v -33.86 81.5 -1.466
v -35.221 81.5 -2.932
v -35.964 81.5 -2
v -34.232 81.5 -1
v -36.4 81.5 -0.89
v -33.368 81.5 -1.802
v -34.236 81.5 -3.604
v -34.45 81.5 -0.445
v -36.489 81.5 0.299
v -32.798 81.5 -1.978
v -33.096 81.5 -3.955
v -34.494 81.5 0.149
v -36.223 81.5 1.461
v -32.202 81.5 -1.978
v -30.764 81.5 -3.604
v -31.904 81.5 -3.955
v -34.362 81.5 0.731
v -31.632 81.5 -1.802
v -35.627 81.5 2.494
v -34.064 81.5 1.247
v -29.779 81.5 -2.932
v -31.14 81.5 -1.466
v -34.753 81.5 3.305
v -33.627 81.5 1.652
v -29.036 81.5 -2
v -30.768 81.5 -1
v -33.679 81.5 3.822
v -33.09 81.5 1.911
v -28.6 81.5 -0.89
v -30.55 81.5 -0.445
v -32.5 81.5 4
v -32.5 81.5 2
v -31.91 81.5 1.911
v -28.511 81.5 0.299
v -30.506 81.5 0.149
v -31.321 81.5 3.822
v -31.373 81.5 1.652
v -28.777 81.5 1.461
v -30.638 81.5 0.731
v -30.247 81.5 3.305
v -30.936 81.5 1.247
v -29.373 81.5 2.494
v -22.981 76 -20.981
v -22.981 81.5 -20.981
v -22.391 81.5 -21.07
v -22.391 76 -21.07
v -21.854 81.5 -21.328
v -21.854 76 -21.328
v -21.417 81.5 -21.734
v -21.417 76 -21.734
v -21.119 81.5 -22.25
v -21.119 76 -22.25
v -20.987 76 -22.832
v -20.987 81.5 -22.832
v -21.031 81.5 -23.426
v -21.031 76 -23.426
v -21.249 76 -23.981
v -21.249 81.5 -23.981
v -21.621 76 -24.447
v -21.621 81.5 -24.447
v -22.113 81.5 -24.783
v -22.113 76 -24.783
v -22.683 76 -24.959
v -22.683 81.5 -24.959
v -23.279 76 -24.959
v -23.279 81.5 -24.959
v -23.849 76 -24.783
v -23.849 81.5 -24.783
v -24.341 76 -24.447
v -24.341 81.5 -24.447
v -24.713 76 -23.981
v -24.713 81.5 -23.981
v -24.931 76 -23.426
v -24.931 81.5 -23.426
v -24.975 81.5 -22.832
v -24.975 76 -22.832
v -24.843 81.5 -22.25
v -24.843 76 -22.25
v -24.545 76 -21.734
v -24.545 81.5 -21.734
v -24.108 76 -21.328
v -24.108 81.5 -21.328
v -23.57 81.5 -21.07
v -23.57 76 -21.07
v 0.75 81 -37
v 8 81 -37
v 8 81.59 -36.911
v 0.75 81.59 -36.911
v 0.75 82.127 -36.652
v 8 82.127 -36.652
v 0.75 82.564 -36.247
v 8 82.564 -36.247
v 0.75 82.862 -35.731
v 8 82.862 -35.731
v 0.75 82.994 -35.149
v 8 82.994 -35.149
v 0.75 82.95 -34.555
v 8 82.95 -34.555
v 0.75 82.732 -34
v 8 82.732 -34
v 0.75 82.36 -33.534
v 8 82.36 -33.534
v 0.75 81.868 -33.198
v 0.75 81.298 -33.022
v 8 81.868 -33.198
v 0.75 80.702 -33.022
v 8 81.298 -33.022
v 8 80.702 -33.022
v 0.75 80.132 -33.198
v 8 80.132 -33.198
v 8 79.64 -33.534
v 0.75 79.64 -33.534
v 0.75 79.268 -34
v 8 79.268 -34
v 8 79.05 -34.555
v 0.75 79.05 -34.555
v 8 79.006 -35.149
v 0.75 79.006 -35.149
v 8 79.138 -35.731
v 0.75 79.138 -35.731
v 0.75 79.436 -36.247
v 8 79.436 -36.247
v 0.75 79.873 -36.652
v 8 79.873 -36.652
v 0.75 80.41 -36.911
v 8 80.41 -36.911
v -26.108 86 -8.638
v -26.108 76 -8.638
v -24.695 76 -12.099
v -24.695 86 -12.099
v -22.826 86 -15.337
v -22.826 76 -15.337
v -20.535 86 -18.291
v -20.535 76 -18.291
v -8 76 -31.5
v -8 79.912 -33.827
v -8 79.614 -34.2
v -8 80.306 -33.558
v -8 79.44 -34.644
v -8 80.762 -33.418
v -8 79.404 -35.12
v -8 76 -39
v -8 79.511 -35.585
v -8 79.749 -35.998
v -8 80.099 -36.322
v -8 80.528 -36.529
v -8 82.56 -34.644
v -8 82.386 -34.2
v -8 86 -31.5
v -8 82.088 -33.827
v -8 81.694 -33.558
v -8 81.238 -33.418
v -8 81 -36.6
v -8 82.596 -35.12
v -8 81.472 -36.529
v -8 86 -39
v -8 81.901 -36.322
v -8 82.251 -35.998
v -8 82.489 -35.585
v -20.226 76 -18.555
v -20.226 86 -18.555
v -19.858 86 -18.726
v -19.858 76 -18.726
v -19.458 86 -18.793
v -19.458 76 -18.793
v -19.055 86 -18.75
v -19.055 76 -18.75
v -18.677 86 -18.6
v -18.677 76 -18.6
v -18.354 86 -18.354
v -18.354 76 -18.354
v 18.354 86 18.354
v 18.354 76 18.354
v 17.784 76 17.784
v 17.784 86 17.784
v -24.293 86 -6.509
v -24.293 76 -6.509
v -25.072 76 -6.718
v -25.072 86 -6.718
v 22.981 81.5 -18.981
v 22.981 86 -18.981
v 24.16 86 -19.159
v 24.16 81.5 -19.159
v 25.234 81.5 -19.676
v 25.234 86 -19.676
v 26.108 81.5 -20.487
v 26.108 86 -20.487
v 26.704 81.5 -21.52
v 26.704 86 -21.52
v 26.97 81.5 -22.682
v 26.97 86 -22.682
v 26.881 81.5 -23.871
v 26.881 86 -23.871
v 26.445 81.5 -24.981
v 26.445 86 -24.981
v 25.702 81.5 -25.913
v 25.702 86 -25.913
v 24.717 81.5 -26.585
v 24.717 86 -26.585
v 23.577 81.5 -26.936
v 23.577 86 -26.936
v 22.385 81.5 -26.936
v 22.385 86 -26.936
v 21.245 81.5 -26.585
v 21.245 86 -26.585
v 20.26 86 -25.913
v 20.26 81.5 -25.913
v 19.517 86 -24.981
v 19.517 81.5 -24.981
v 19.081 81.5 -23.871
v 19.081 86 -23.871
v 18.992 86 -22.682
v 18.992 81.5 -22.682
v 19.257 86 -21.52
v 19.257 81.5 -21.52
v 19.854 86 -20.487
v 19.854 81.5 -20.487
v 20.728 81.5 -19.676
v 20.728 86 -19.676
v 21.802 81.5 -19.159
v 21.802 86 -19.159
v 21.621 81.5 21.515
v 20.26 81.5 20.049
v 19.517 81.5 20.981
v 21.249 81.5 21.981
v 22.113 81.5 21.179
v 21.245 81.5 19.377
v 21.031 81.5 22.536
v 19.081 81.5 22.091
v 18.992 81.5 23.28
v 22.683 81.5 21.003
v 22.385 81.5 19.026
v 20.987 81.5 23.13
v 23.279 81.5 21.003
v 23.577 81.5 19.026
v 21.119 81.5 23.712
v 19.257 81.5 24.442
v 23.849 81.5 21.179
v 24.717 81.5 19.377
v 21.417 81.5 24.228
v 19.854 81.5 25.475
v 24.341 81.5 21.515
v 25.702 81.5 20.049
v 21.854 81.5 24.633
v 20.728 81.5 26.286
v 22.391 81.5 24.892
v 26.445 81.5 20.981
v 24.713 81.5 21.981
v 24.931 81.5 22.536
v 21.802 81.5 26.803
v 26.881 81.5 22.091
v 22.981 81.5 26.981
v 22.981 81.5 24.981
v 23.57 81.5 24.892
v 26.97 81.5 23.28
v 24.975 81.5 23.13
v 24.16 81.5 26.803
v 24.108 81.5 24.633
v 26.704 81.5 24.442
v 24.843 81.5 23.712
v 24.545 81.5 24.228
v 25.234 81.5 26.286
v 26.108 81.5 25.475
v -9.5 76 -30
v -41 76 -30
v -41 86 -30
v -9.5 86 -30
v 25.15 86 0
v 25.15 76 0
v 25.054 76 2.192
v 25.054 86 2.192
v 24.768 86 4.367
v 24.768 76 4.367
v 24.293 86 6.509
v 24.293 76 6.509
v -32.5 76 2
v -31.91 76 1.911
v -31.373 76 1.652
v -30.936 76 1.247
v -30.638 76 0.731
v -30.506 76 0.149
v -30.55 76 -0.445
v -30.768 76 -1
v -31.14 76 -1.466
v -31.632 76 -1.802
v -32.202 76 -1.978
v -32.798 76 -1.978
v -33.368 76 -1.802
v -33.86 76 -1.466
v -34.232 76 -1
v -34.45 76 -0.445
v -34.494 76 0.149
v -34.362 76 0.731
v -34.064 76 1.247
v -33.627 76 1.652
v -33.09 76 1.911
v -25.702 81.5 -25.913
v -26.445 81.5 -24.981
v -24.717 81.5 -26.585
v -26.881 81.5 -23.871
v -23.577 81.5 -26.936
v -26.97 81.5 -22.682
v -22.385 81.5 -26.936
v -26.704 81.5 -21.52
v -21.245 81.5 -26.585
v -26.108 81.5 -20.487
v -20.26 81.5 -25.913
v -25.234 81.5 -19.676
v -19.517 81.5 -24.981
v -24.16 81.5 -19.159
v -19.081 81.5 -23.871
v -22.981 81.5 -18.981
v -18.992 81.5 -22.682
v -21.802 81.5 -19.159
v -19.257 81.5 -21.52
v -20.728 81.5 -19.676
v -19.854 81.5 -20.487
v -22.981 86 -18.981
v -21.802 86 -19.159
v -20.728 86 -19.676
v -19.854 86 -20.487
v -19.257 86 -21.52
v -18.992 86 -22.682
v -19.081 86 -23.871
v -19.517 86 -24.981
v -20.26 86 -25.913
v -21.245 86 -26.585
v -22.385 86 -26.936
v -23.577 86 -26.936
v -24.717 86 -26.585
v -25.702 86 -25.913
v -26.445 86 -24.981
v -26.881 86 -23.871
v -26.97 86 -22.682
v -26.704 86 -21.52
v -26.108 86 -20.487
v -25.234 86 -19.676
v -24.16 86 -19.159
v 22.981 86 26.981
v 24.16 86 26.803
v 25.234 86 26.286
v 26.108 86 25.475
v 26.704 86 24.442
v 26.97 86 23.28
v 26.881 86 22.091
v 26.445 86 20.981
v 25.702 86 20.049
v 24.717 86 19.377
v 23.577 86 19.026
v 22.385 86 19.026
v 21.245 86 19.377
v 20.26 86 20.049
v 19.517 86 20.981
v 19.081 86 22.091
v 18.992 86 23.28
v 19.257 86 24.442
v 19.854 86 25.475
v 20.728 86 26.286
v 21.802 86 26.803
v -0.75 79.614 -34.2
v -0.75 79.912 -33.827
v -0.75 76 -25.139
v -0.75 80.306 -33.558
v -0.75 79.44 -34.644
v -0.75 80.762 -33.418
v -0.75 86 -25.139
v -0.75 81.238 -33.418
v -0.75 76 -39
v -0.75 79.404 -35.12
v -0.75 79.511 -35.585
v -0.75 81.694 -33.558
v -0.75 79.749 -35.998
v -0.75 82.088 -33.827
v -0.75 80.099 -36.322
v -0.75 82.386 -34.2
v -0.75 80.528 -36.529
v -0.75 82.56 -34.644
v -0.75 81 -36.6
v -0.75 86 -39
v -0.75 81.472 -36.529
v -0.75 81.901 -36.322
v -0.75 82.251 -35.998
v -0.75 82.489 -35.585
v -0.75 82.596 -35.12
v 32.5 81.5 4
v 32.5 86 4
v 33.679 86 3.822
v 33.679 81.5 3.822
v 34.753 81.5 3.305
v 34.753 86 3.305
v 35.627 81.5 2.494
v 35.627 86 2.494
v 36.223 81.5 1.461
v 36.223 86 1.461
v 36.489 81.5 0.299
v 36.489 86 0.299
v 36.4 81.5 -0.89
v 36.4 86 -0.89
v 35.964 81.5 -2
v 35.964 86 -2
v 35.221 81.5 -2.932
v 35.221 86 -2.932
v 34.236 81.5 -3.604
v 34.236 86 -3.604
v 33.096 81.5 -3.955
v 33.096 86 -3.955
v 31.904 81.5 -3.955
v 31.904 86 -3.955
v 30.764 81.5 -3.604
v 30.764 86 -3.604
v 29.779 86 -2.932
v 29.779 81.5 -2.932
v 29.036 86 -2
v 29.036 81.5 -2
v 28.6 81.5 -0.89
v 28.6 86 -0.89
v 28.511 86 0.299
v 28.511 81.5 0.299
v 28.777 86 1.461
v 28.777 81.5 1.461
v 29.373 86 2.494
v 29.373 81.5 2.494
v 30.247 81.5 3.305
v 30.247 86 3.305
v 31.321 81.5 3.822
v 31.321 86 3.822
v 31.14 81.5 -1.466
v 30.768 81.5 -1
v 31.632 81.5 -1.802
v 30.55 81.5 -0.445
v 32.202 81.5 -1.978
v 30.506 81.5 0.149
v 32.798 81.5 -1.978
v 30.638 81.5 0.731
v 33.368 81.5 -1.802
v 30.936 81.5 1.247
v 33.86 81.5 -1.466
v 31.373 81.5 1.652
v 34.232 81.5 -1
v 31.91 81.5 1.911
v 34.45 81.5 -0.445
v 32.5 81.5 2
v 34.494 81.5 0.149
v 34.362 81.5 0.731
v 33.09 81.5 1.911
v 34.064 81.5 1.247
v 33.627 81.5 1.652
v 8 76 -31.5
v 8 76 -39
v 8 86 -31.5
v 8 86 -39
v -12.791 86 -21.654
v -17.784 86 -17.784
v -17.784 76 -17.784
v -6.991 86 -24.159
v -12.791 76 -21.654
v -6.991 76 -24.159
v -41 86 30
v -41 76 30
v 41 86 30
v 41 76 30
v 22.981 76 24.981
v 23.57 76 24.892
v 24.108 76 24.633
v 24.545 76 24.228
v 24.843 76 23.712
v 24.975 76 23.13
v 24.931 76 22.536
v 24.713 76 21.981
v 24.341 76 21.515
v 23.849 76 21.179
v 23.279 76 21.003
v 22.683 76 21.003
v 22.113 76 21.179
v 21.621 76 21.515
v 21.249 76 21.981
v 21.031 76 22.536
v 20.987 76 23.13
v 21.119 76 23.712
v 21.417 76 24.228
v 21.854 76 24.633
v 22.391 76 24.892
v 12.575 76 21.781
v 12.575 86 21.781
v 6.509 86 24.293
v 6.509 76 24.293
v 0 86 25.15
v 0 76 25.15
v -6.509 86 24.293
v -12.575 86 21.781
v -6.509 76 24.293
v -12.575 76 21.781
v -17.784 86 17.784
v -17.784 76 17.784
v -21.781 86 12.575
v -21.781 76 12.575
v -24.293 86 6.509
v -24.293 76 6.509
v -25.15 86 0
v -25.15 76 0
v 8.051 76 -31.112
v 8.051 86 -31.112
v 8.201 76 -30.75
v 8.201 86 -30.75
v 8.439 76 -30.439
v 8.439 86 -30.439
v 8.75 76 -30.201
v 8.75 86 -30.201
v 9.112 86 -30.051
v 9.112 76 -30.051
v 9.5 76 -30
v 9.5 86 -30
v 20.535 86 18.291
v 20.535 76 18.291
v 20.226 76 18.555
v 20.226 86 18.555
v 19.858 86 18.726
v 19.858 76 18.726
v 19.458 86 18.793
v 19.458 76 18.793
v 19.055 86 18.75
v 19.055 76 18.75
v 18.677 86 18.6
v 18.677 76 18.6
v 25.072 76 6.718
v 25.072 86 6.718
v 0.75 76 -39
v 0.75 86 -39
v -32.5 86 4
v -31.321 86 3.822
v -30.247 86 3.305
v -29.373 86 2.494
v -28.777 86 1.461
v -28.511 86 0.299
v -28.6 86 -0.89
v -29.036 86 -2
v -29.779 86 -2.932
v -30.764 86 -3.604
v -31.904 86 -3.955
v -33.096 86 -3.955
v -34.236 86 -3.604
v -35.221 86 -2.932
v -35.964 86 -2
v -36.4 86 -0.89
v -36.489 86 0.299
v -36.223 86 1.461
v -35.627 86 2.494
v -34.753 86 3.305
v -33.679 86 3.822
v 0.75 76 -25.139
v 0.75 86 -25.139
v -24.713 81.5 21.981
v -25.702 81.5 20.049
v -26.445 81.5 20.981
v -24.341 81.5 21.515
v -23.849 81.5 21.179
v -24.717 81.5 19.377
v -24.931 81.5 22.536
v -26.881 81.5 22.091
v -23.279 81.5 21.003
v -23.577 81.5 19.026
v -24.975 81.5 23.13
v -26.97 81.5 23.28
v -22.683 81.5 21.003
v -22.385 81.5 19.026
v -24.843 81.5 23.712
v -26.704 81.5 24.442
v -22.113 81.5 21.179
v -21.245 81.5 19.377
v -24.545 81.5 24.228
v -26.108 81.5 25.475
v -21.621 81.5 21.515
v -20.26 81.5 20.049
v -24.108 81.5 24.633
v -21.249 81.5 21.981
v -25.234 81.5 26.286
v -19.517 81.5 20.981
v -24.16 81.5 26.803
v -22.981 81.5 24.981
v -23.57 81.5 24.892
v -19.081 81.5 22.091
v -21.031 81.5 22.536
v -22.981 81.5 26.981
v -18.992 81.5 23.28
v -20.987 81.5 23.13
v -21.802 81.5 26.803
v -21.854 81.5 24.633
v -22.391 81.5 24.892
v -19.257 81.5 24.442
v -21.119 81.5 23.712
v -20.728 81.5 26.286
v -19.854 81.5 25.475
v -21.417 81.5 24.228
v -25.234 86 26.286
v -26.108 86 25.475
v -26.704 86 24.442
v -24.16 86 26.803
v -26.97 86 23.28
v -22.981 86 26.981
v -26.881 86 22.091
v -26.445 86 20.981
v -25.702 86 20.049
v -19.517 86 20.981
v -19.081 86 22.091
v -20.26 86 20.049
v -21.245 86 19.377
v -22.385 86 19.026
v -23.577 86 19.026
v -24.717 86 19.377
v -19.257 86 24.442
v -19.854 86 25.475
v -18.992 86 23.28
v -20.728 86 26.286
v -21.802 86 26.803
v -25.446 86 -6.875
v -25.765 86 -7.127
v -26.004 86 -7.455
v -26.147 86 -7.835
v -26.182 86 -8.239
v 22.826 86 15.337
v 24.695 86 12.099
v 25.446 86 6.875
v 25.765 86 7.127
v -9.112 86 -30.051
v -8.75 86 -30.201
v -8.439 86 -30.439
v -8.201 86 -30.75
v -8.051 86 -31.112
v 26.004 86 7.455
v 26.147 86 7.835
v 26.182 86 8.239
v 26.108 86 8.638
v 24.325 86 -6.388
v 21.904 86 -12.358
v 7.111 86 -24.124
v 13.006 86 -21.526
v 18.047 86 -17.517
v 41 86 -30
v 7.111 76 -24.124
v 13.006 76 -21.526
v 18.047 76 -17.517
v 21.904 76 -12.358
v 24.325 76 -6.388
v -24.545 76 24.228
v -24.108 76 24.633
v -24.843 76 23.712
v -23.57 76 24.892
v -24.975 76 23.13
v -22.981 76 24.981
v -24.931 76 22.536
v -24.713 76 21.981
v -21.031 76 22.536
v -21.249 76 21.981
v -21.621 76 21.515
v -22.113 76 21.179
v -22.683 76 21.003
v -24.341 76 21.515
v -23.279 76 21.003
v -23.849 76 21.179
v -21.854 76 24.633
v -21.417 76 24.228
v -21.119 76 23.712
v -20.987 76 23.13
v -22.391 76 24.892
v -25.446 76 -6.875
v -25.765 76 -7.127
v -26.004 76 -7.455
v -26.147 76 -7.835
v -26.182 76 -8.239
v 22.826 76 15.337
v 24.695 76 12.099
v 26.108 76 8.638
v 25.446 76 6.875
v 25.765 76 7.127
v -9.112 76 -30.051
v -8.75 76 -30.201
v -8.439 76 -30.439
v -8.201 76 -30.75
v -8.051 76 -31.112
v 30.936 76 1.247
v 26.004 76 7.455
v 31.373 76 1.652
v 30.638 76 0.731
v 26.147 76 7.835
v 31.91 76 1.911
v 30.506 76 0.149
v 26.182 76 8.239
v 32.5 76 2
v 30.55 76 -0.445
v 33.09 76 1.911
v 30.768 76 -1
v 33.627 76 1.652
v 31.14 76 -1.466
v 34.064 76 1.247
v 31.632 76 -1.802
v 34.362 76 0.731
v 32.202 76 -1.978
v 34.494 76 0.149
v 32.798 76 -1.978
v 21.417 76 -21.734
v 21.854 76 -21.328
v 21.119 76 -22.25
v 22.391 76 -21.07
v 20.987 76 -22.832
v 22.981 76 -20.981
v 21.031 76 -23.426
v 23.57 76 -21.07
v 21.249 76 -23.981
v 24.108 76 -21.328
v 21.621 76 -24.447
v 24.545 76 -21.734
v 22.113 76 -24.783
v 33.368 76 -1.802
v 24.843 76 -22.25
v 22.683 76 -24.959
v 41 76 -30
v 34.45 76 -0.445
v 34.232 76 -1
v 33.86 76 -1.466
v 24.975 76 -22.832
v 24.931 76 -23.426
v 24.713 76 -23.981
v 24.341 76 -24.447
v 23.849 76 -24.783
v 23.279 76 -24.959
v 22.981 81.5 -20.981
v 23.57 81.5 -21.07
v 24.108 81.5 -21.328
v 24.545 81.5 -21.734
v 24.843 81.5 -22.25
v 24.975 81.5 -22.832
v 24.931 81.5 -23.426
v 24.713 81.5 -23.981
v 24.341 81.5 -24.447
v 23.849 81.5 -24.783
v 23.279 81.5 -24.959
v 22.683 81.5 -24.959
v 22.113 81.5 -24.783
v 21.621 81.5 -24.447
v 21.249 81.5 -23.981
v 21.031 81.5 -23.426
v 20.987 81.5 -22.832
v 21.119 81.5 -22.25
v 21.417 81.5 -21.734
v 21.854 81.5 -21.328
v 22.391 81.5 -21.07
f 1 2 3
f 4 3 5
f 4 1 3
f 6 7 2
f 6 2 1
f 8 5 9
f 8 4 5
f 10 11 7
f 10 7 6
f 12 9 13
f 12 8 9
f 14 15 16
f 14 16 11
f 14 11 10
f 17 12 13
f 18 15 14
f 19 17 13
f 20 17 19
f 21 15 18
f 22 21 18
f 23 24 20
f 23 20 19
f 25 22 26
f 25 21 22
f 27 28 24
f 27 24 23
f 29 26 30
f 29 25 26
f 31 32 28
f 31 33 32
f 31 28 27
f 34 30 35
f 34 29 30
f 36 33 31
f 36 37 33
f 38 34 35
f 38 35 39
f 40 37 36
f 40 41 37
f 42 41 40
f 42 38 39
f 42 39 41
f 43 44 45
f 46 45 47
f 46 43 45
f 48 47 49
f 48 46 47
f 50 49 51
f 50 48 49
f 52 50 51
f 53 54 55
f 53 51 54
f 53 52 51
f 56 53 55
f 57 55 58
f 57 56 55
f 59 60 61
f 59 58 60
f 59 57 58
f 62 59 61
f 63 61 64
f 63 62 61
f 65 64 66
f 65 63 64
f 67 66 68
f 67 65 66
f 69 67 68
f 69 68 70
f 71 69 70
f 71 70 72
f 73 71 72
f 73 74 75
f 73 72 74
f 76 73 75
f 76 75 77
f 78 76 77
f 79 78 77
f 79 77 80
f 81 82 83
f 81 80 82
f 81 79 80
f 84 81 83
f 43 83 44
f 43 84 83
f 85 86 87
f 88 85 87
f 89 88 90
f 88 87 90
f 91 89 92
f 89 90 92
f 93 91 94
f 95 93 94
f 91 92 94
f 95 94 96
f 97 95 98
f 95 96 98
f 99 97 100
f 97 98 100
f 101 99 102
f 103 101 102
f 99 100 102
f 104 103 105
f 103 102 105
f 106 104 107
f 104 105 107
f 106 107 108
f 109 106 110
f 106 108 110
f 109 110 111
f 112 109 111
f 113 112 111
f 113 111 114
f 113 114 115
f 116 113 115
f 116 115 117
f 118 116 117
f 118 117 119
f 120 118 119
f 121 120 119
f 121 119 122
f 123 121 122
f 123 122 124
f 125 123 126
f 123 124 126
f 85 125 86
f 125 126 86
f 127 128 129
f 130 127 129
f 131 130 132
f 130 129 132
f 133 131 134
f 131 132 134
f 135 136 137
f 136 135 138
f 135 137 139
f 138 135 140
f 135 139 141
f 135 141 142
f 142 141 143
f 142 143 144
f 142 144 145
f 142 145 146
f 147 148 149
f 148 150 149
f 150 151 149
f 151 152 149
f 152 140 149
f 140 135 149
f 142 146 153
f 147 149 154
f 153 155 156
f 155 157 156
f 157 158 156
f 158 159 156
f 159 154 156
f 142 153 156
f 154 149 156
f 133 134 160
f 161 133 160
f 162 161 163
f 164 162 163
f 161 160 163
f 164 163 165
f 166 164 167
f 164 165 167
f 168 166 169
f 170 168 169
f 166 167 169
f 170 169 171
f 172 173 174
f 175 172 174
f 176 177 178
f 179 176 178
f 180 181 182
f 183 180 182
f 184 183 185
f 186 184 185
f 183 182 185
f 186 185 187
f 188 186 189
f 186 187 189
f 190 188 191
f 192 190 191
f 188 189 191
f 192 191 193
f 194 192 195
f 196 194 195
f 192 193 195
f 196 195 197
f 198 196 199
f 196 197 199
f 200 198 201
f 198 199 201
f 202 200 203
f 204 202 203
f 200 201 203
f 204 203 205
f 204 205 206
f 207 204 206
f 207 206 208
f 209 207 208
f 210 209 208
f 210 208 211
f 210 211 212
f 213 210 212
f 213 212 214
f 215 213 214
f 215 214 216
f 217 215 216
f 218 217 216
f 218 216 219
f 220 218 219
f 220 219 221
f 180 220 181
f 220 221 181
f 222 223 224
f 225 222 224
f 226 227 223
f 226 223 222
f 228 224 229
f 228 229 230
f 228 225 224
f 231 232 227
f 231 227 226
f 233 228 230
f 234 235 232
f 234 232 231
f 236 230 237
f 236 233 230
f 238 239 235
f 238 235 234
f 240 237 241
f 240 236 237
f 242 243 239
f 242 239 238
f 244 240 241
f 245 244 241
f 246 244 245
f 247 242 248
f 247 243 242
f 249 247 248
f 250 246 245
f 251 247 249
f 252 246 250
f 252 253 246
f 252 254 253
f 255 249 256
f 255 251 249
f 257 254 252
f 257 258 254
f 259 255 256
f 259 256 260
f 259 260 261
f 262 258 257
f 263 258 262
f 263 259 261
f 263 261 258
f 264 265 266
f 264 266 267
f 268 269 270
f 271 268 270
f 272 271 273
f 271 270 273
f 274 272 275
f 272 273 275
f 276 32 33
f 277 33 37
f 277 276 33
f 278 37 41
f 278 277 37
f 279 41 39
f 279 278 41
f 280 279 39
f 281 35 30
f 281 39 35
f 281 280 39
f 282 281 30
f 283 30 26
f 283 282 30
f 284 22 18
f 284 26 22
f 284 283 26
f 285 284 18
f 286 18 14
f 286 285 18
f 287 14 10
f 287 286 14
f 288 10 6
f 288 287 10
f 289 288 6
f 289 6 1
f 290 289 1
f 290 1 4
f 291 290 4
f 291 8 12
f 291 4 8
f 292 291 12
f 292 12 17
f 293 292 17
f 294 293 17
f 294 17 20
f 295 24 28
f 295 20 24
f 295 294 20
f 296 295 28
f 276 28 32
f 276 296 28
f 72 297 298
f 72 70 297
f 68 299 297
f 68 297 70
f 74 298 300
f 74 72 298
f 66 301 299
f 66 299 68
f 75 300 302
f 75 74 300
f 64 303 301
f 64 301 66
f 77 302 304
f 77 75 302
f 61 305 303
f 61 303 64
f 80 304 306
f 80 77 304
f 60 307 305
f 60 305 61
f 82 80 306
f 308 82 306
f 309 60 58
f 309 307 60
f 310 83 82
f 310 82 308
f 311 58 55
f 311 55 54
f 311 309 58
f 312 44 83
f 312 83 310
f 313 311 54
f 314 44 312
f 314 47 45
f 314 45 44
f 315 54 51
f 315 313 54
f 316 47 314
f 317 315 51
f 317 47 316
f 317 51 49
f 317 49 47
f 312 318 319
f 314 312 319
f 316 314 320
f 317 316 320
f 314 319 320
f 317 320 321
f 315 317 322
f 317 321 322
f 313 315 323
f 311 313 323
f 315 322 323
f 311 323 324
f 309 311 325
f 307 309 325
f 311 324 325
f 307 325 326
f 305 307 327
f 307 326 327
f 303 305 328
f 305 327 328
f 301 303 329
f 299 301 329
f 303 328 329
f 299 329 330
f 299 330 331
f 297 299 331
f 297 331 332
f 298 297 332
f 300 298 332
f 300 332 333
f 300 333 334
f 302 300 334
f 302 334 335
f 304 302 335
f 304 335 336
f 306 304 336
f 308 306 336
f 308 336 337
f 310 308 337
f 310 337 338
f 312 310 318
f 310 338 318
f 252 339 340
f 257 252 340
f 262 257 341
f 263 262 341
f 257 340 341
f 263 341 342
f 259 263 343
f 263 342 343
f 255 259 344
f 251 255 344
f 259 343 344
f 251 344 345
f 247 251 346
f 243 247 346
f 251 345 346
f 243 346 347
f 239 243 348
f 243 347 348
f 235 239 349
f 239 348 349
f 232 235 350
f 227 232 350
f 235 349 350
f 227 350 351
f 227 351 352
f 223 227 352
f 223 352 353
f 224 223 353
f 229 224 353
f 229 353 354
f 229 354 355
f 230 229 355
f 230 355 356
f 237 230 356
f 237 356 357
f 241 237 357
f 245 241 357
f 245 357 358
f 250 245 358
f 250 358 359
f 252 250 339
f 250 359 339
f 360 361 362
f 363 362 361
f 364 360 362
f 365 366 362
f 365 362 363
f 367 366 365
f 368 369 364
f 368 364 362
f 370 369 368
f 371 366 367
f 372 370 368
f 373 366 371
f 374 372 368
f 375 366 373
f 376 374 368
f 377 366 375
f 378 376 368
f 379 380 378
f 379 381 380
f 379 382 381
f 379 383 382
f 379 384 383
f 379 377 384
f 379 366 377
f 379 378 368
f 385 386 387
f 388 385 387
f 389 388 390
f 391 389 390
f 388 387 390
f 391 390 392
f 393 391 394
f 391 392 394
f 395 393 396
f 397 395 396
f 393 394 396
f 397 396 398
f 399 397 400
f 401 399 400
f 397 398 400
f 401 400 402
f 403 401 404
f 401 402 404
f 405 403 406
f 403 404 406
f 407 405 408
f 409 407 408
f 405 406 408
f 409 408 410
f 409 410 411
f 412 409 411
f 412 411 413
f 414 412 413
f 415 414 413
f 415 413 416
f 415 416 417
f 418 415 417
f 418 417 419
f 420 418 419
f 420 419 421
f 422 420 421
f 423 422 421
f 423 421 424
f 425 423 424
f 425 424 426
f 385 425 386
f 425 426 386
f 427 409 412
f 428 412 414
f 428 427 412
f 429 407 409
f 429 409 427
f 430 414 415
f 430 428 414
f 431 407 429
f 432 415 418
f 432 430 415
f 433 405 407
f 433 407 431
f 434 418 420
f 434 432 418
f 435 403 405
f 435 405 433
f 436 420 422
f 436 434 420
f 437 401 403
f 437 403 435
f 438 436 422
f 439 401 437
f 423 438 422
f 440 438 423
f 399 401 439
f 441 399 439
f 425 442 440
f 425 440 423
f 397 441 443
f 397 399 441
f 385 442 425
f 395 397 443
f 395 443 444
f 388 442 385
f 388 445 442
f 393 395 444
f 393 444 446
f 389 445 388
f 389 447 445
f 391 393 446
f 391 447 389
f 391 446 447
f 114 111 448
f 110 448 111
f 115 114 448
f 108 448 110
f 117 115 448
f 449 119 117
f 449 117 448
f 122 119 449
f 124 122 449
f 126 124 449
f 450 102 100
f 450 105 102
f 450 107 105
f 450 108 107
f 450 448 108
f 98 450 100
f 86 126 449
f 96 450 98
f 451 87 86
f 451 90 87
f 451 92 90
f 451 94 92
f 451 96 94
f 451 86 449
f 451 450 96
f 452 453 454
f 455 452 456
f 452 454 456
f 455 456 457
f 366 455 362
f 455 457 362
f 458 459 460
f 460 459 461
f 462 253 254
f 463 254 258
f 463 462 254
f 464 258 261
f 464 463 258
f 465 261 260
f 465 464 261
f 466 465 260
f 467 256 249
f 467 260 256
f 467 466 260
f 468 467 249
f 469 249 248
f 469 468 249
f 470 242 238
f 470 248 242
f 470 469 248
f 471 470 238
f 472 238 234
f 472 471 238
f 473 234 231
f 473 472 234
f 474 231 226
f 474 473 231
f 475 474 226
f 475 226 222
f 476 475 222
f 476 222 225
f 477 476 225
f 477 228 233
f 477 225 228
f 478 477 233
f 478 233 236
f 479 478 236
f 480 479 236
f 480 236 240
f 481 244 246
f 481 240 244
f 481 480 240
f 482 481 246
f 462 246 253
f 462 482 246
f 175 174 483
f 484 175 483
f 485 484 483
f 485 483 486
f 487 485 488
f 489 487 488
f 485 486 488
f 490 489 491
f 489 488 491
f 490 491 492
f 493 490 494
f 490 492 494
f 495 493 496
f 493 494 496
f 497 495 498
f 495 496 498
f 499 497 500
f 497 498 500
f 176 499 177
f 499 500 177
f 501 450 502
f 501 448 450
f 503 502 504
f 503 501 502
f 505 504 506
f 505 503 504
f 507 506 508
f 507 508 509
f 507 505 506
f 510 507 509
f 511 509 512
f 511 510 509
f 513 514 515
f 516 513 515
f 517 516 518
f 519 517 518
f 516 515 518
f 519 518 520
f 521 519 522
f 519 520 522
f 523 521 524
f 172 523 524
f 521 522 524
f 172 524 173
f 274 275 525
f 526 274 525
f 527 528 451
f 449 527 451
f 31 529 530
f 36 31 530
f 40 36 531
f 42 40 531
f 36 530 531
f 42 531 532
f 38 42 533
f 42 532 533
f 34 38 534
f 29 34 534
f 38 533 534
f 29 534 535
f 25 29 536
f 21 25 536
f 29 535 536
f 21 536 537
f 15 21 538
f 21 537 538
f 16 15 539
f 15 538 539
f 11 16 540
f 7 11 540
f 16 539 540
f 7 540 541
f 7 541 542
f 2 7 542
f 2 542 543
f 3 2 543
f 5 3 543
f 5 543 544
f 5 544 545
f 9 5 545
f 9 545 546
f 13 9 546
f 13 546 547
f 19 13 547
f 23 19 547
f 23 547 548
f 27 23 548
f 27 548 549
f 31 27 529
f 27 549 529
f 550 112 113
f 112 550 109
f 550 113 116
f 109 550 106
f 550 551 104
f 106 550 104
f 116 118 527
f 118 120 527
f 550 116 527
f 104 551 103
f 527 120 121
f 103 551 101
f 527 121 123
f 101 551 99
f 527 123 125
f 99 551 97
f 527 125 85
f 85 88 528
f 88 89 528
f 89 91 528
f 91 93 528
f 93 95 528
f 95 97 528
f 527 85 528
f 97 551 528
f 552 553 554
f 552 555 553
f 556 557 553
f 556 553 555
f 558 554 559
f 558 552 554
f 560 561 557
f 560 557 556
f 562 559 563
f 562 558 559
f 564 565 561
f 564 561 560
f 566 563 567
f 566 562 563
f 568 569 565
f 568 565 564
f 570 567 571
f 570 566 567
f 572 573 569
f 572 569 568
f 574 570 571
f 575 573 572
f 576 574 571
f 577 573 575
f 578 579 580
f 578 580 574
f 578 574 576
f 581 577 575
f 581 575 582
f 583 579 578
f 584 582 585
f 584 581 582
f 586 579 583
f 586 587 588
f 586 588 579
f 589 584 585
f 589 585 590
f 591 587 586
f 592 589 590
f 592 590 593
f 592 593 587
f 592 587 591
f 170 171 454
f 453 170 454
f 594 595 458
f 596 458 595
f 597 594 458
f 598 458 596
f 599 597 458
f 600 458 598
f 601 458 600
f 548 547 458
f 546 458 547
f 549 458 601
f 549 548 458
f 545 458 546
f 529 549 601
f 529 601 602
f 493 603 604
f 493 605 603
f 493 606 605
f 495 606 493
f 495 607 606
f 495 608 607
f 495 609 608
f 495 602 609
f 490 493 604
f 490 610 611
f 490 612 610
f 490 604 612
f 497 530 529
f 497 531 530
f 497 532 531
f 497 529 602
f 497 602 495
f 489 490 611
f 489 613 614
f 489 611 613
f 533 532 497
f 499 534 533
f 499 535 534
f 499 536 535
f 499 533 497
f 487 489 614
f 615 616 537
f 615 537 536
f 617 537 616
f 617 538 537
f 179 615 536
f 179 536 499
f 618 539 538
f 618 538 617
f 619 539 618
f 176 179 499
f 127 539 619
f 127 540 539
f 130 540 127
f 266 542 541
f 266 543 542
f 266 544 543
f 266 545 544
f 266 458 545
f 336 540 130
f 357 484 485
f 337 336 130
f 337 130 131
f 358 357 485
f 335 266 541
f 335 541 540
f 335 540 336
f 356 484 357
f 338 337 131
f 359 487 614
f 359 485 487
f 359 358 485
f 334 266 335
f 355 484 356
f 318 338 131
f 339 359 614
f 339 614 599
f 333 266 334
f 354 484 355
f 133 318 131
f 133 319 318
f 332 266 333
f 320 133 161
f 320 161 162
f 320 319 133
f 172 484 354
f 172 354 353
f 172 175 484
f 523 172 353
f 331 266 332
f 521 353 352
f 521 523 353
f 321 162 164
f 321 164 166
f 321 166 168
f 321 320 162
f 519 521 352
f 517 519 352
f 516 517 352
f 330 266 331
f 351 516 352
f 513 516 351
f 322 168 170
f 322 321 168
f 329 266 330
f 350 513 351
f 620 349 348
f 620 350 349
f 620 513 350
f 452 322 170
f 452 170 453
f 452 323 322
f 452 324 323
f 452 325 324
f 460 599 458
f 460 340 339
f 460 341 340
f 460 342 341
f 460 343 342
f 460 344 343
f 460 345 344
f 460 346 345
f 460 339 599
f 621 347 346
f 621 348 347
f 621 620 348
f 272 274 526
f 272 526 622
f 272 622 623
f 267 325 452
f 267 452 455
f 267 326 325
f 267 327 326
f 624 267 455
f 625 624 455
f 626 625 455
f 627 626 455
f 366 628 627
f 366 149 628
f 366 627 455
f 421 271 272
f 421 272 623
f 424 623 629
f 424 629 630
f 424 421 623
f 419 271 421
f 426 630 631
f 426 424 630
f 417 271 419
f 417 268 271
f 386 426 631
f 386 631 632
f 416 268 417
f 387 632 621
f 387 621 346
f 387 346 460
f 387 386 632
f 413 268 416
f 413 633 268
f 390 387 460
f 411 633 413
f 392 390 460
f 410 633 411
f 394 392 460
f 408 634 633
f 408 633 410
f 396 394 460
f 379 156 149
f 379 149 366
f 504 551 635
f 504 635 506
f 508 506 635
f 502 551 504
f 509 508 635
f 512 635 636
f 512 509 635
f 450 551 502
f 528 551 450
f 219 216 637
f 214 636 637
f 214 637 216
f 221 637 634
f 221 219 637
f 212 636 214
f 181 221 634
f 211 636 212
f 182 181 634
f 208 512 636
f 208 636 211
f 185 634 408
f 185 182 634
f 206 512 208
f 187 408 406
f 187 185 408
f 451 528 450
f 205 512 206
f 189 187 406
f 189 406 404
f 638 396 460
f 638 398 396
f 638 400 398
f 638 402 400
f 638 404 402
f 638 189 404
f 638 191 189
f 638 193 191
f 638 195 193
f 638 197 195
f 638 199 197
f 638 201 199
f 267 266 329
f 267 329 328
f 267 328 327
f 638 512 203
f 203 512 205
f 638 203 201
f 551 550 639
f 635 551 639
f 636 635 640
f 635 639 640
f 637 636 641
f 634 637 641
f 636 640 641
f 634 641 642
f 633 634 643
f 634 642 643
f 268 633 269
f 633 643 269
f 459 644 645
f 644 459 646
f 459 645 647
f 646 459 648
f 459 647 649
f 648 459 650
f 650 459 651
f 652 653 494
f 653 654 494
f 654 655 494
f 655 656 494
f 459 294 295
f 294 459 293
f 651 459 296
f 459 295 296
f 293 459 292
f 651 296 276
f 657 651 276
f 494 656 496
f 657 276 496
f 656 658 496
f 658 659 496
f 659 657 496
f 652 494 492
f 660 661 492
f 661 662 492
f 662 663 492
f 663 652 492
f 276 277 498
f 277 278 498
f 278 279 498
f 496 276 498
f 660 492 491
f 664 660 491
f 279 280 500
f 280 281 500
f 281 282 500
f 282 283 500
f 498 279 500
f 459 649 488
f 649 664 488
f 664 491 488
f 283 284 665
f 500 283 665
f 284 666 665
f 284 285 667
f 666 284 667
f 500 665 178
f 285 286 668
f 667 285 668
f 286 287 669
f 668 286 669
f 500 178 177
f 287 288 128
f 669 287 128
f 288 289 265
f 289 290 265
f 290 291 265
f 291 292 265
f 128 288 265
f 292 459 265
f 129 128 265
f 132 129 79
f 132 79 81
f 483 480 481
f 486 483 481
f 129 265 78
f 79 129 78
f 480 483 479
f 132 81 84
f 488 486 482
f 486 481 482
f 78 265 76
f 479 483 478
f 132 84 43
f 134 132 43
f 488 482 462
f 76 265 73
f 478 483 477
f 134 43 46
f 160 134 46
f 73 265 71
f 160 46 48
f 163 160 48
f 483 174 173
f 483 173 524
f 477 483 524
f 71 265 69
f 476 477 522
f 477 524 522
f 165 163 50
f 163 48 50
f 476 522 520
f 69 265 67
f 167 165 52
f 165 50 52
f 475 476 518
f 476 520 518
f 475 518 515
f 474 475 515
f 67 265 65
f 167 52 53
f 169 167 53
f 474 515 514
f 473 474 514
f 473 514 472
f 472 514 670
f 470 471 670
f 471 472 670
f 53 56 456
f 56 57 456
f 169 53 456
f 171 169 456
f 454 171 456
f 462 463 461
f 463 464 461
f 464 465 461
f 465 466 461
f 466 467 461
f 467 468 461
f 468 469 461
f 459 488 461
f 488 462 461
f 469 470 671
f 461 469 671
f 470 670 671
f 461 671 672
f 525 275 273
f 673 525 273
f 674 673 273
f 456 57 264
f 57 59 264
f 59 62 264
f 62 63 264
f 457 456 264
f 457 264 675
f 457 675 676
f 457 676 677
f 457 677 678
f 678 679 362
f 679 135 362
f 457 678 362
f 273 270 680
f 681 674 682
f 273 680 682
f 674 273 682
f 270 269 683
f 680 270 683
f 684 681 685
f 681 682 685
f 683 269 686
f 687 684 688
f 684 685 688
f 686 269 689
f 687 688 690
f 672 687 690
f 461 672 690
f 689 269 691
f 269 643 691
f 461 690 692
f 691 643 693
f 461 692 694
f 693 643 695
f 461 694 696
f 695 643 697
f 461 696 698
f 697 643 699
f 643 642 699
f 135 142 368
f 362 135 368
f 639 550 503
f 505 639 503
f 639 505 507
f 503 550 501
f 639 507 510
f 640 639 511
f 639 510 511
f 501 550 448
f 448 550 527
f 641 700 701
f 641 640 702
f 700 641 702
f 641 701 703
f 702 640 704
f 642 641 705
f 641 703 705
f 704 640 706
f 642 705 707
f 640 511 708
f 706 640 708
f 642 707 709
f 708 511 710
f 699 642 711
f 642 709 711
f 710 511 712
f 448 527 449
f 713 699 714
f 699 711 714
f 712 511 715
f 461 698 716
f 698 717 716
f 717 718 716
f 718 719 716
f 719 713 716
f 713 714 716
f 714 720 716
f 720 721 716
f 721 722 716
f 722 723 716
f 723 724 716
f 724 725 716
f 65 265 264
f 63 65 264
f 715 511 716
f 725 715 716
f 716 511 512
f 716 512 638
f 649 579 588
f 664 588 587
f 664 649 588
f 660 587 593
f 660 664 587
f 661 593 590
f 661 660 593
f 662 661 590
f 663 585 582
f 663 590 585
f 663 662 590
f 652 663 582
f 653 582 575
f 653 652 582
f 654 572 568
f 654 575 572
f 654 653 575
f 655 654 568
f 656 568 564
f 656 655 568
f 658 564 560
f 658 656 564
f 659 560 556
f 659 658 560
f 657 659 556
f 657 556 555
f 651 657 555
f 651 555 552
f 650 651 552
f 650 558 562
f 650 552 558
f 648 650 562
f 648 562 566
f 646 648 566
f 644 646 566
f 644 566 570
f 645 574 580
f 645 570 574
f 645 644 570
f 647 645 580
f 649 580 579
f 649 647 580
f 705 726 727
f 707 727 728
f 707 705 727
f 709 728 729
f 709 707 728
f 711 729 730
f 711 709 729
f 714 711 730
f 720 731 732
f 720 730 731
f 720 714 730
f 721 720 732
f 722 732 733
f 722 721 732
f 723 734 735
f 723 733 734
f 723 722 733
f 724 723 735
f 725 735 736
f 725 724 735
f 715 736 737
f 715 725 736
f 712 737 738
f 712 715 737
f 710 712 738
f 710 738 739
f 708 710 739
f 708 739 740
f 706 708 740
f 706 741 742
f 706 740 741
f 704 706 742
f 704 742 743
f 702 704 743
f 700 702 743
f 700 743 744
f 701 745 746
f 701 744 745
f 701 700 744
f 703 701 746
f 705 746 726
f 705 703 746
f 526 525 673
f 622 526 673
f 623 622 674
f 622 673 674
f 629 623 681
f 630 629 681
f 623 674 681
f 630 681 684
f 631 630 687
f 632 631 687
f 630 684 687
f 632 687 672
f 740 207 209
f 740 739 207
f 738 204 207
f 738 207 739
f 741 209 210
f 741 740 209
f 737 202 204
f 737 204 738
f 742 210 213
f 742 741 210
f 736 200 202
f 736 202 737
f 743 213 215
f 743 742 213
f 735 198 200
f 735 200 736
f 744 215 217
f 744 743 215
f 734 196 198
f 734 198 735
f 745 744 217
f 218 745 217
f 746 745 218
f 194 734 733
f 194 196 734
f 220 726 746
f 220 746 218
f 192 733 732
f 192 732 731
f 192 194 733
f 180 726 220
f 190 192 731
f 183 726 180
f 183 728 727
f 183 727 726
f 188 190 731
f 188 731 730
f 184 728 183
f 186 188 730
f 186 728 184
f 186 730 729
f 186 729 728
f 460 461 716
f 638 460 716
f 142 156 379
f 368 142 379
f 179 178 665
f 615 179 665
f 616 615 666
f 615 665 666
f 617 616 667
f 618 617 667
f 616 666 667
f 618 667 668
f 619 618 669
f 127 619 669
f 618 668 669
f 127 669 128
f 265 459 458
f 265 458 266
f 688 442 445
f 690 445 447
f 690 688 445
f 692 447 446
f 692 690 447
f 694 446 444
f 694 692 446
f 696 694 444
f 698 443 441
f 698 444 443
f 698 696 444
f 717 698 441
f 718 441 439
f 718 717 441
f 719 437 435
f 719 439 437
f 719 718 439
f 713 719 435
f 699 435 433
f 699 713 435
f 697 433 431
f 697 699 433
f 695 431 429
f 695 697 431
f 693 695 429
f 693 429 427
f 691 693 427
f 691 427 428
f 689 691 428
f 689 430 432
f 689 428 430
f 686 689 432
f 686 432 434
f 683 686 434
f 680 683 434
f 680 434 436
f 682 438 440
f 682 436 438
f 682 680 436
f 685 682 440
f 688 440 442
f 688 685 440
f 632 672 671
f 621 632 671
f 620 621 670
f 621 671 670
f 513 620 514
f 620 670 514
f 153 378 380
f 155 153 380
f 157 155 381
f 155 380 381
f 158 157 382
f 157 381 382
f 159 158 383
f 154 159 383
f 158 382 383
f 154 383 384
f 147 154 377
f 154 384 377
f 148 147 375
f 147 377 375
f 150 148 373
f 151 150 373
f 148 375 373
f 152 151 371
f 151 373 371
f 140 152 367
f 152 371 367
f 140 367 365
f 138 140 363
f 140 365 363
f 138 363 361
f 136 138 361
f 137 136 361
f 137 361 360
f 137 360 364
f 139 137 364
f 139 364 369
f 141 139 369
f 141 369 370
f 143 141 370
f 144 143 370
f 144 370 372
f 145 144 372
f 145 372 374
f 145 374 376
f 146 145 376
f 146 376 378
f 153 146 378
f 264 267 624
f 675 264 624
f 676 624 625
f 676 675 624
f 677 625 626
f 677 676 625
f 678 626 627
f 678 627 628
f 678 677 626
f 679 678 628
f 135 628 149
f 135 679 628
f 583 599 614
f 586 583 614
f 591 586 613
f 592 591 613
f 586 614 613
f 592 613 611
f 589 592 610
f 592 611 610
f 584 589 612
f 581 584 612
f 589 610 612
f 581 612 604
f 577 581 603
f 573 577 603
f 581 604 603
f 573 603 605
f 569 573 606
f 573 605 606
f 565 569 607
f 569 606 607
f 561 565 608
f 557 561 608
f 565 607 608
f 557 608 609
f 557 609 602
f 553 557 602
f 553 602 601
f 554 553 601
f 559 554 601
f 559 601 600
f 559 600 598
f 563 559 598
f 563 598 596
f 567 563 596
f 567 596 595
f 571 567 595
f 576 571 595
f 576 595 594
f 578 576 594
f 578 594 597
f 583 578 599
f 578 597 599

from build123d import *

# Parameters (mm, degrees)
SKETCH1_W           = 82
SKETCH1_H           = 60
SKETCH1_R           = 1.999999999
SKETCH1_R_2         = 2.000000001
SKETCH1_R_3         = 1.999999998
SKETCH1_R_4         = 2.000000002
BOSS_EXTRUDE1_DEPTH = 10
SKETCH2_W           = 16
SKETCH2_H           = 9
BOSS_EXTRUDE2_DEPTH = 10
SKETCH3_W           = 1.5
SKETCH3_H           = 14
CUT_EXTRUDE1_DEPTH  = 10
SKETCH4_R           = 2
CUT_EXTRUDE2_DEPTH  = 7.25
SKETCH5_R           = 1.6
CUT_EXTRUDE3_DEPTH  = 10
SKETCH7_R           = 4.000000002
SKETCH7_R_2         = 4.000000001
SKETCH7_R_3         = 4
SKETCH7_R_4         = 3.999999999
SKETCH7_R_5         = 3.999999998
CUT_EXTRUDE4_DEPTH  = 4.5
FILLET1_R           = 1.5


with BuildPart() as part:
    # Sketch1 → Boss-Extrude1 (new body)
    with BuildSketch(Plane(origin=(0, 76, 0), x_dir=(1, 0, 0), z_dir=(0, 1, 0))):
        Rectangle(SKETCH1_W, SKETCH1_H)
        with Locations(Location((-22.980970387, -22.98097039, 0), (0, 0, 270))):
            Circle(SKETCH1_R, mode=Mode.SUBTRACT)
        with Locations(Location((-32.5, -2e-09, 0), (0, 0, 270))):
            Circle(SKETCH1_R_2, mode=Mode.SUBTRACT)
        with Locations(Location((22.98097039, -22.980970387, 0), (0, 0, 270))):
            Circle(SKETCH1_R_3, mode=Mode.SUBTRACT)
        with BuildLine():
            ThreePointArc((-20.534900496, 18.291196287), (-19.458102274, 18.792869946), (-18.354154843, 18.354154843))
            Line((-18.354154843, 18.354154843), (-17.783735547, 17.783735547))
            ThreePointArc((-17.783735547, 17.783735547), (9.624488324, 23.235570243), (25.15, 0))
            ThreePointArc((25.15, 0), (24.934838264, -3.282733734), (24.293034531, -6.509298984))
            Line((24.293034531, -6.509298984), (25.072241781, -6.718086938))
            ThreePointArc((25.072241781, -6.718086938), (26.00415392, -7.454775906), (26.108090898, -8.638147351))
            ThreePointArc((26.108090898, -8.638147351), (23.815698604, -13.75), (20.534900496, -18.291196287))
            ThreePointArc((20.534900496, -18.291196287), (19.458102274, -18.792869946), (18.354154843, -18.354154843))
            Line((18.354154843, -18.354154843), (17.783735547, -17.783735547))
            ThreePointArc((17.783735547, -17.783735547), (-12.575, -21.780538905), (-24.293034531, 6.509298984))
            Line((-24.293034531, 6.509298984), (-25.072241781, 6.718086938))
            ThreePointArc((-25.072241781, 6.718086938), (-26.00415392, 7.454775906), (-26.108090898, 8.638147351))
            ThreePointArc((-26.108090898, 8.638147351), (-23.815698604, 13.75), (-20.534900496, 18.291196287))
        make_face(mode=Mode.SUBTRACT)
        with Locations(Location((-22.98097039, 22.980970387, 0), (0, 0, 270))):
            Circle(SKETCH1_R_4, mode=Mode.SUBTRACT)
        with Locations(Location((32.5, 2e-09, 0), (0, 0, 270))):
            Circle(SKETCH1_R, mode=Mode.SUBTRACT)
        with Locations(Location((22.980970387, 22.98097039, 0), (0, 0, 270))):
            Circle(SKETCH1_R_2, mode=Mode.SUBTRACT)
    extrude(amount=BOSS_EXTRUDE1_DEPTH)

    # Sketch2 → Boss-Extrude2 (add)
    with BuildSketch(Plane(origin=(0, 86, 0), x_dir=(1, 0, 0), z_dir=(0, 1, 0))):
        with Locations((0, 34.5)):
            Rectangle(SKETCH2_W, SKETCH2_H)
    extrude(amount=-BOSS_EXTRUDE2_DEPTH)

    # Sketch3 → Cut-Extrude1 (cut)
    with BuildSketch(Plane(origin=(0, 86, 0), x_dir=(1, 0, 0), z_dir=(0, 1, 0))):
        with Locations((0, 32)):
            Rectangle(SKETCH3_W, SKETCH3_H)
    extrude(amount=-CUT_EXTRUDE1_DEPTH, mode=Mode.SUBTRACT)

    # Sketch4 → Cut-Extrude2 (cut)
    with BuildSketch(Plane(origin=(8, 0, 0), x_dir=(0, 0, -1), z_dir=(1, 0, 0))):
        with Locations((35, 81)):
            Circle(SKETCH4_R)
    extrude(amount=-CUT_EXTRUDE2_DEPTH, mode=Mode.SUBTRACT)

    # Sketch5 → Cut-Extrude3 (cut)
    with BuildSketch(Plane(origin=(-0.75, 0, 0), x_dir=(0, 0, -1), z_dir=(1, 0, 0))):
        with Locations((35, 81)):
            Circle(SKETCH5_R)
    extrude(amount=-CUT_EXTRUDE3_DEPTH, mode=Mode.SUBTRACT)

    # Sketch7 → Cut-Extrude4 (cut)
    with BuildSketch(Plane(origin=(0, 86, 0), x_dir=(1, 0, 0), z_dir=(0, 1, 0))):
        with Locations(Location((-22.98097039, 22.980970387, 0), (0, 0, 270))):
            Circle(SKETCH7_R)
        with Locations(Location((22.980970387, 22.98097039, 0), (0, 0, 270))):
            Circle(SKETCH7_R_2)
        with Locations(Location((32.5, 0, 0), (0, 0, 270))):
            Circle(SKETCH7_R_3)
        with Locations(Location((-32.5, 0, 0), (0, 0, 270))):
            Circle(SKETCH7_R_3)
        with Locations(Location((-22.980970387, -22.98097039, 0), (0, 0, 270))):
            Circle(SKETCH7_R_4)
        with Locations(Location((22.98097039, -22.980970387, 0), (0, 0, 270))):
            Circle(SKETCH7_R_5)
    extrude(amount=-CUT_EXTRUDE4_DEPTH, mode=Mode.SUBTRACT)

    # Fillet1
    fillet1_edges = [part.edges().sort_by_distance(p)[0] for p in [
        (8, 81, -30),
        (-8, 81, -30),
    ]]
    fillet(fillet1_edges, radius=FILLET1_R)


solid = part.part
